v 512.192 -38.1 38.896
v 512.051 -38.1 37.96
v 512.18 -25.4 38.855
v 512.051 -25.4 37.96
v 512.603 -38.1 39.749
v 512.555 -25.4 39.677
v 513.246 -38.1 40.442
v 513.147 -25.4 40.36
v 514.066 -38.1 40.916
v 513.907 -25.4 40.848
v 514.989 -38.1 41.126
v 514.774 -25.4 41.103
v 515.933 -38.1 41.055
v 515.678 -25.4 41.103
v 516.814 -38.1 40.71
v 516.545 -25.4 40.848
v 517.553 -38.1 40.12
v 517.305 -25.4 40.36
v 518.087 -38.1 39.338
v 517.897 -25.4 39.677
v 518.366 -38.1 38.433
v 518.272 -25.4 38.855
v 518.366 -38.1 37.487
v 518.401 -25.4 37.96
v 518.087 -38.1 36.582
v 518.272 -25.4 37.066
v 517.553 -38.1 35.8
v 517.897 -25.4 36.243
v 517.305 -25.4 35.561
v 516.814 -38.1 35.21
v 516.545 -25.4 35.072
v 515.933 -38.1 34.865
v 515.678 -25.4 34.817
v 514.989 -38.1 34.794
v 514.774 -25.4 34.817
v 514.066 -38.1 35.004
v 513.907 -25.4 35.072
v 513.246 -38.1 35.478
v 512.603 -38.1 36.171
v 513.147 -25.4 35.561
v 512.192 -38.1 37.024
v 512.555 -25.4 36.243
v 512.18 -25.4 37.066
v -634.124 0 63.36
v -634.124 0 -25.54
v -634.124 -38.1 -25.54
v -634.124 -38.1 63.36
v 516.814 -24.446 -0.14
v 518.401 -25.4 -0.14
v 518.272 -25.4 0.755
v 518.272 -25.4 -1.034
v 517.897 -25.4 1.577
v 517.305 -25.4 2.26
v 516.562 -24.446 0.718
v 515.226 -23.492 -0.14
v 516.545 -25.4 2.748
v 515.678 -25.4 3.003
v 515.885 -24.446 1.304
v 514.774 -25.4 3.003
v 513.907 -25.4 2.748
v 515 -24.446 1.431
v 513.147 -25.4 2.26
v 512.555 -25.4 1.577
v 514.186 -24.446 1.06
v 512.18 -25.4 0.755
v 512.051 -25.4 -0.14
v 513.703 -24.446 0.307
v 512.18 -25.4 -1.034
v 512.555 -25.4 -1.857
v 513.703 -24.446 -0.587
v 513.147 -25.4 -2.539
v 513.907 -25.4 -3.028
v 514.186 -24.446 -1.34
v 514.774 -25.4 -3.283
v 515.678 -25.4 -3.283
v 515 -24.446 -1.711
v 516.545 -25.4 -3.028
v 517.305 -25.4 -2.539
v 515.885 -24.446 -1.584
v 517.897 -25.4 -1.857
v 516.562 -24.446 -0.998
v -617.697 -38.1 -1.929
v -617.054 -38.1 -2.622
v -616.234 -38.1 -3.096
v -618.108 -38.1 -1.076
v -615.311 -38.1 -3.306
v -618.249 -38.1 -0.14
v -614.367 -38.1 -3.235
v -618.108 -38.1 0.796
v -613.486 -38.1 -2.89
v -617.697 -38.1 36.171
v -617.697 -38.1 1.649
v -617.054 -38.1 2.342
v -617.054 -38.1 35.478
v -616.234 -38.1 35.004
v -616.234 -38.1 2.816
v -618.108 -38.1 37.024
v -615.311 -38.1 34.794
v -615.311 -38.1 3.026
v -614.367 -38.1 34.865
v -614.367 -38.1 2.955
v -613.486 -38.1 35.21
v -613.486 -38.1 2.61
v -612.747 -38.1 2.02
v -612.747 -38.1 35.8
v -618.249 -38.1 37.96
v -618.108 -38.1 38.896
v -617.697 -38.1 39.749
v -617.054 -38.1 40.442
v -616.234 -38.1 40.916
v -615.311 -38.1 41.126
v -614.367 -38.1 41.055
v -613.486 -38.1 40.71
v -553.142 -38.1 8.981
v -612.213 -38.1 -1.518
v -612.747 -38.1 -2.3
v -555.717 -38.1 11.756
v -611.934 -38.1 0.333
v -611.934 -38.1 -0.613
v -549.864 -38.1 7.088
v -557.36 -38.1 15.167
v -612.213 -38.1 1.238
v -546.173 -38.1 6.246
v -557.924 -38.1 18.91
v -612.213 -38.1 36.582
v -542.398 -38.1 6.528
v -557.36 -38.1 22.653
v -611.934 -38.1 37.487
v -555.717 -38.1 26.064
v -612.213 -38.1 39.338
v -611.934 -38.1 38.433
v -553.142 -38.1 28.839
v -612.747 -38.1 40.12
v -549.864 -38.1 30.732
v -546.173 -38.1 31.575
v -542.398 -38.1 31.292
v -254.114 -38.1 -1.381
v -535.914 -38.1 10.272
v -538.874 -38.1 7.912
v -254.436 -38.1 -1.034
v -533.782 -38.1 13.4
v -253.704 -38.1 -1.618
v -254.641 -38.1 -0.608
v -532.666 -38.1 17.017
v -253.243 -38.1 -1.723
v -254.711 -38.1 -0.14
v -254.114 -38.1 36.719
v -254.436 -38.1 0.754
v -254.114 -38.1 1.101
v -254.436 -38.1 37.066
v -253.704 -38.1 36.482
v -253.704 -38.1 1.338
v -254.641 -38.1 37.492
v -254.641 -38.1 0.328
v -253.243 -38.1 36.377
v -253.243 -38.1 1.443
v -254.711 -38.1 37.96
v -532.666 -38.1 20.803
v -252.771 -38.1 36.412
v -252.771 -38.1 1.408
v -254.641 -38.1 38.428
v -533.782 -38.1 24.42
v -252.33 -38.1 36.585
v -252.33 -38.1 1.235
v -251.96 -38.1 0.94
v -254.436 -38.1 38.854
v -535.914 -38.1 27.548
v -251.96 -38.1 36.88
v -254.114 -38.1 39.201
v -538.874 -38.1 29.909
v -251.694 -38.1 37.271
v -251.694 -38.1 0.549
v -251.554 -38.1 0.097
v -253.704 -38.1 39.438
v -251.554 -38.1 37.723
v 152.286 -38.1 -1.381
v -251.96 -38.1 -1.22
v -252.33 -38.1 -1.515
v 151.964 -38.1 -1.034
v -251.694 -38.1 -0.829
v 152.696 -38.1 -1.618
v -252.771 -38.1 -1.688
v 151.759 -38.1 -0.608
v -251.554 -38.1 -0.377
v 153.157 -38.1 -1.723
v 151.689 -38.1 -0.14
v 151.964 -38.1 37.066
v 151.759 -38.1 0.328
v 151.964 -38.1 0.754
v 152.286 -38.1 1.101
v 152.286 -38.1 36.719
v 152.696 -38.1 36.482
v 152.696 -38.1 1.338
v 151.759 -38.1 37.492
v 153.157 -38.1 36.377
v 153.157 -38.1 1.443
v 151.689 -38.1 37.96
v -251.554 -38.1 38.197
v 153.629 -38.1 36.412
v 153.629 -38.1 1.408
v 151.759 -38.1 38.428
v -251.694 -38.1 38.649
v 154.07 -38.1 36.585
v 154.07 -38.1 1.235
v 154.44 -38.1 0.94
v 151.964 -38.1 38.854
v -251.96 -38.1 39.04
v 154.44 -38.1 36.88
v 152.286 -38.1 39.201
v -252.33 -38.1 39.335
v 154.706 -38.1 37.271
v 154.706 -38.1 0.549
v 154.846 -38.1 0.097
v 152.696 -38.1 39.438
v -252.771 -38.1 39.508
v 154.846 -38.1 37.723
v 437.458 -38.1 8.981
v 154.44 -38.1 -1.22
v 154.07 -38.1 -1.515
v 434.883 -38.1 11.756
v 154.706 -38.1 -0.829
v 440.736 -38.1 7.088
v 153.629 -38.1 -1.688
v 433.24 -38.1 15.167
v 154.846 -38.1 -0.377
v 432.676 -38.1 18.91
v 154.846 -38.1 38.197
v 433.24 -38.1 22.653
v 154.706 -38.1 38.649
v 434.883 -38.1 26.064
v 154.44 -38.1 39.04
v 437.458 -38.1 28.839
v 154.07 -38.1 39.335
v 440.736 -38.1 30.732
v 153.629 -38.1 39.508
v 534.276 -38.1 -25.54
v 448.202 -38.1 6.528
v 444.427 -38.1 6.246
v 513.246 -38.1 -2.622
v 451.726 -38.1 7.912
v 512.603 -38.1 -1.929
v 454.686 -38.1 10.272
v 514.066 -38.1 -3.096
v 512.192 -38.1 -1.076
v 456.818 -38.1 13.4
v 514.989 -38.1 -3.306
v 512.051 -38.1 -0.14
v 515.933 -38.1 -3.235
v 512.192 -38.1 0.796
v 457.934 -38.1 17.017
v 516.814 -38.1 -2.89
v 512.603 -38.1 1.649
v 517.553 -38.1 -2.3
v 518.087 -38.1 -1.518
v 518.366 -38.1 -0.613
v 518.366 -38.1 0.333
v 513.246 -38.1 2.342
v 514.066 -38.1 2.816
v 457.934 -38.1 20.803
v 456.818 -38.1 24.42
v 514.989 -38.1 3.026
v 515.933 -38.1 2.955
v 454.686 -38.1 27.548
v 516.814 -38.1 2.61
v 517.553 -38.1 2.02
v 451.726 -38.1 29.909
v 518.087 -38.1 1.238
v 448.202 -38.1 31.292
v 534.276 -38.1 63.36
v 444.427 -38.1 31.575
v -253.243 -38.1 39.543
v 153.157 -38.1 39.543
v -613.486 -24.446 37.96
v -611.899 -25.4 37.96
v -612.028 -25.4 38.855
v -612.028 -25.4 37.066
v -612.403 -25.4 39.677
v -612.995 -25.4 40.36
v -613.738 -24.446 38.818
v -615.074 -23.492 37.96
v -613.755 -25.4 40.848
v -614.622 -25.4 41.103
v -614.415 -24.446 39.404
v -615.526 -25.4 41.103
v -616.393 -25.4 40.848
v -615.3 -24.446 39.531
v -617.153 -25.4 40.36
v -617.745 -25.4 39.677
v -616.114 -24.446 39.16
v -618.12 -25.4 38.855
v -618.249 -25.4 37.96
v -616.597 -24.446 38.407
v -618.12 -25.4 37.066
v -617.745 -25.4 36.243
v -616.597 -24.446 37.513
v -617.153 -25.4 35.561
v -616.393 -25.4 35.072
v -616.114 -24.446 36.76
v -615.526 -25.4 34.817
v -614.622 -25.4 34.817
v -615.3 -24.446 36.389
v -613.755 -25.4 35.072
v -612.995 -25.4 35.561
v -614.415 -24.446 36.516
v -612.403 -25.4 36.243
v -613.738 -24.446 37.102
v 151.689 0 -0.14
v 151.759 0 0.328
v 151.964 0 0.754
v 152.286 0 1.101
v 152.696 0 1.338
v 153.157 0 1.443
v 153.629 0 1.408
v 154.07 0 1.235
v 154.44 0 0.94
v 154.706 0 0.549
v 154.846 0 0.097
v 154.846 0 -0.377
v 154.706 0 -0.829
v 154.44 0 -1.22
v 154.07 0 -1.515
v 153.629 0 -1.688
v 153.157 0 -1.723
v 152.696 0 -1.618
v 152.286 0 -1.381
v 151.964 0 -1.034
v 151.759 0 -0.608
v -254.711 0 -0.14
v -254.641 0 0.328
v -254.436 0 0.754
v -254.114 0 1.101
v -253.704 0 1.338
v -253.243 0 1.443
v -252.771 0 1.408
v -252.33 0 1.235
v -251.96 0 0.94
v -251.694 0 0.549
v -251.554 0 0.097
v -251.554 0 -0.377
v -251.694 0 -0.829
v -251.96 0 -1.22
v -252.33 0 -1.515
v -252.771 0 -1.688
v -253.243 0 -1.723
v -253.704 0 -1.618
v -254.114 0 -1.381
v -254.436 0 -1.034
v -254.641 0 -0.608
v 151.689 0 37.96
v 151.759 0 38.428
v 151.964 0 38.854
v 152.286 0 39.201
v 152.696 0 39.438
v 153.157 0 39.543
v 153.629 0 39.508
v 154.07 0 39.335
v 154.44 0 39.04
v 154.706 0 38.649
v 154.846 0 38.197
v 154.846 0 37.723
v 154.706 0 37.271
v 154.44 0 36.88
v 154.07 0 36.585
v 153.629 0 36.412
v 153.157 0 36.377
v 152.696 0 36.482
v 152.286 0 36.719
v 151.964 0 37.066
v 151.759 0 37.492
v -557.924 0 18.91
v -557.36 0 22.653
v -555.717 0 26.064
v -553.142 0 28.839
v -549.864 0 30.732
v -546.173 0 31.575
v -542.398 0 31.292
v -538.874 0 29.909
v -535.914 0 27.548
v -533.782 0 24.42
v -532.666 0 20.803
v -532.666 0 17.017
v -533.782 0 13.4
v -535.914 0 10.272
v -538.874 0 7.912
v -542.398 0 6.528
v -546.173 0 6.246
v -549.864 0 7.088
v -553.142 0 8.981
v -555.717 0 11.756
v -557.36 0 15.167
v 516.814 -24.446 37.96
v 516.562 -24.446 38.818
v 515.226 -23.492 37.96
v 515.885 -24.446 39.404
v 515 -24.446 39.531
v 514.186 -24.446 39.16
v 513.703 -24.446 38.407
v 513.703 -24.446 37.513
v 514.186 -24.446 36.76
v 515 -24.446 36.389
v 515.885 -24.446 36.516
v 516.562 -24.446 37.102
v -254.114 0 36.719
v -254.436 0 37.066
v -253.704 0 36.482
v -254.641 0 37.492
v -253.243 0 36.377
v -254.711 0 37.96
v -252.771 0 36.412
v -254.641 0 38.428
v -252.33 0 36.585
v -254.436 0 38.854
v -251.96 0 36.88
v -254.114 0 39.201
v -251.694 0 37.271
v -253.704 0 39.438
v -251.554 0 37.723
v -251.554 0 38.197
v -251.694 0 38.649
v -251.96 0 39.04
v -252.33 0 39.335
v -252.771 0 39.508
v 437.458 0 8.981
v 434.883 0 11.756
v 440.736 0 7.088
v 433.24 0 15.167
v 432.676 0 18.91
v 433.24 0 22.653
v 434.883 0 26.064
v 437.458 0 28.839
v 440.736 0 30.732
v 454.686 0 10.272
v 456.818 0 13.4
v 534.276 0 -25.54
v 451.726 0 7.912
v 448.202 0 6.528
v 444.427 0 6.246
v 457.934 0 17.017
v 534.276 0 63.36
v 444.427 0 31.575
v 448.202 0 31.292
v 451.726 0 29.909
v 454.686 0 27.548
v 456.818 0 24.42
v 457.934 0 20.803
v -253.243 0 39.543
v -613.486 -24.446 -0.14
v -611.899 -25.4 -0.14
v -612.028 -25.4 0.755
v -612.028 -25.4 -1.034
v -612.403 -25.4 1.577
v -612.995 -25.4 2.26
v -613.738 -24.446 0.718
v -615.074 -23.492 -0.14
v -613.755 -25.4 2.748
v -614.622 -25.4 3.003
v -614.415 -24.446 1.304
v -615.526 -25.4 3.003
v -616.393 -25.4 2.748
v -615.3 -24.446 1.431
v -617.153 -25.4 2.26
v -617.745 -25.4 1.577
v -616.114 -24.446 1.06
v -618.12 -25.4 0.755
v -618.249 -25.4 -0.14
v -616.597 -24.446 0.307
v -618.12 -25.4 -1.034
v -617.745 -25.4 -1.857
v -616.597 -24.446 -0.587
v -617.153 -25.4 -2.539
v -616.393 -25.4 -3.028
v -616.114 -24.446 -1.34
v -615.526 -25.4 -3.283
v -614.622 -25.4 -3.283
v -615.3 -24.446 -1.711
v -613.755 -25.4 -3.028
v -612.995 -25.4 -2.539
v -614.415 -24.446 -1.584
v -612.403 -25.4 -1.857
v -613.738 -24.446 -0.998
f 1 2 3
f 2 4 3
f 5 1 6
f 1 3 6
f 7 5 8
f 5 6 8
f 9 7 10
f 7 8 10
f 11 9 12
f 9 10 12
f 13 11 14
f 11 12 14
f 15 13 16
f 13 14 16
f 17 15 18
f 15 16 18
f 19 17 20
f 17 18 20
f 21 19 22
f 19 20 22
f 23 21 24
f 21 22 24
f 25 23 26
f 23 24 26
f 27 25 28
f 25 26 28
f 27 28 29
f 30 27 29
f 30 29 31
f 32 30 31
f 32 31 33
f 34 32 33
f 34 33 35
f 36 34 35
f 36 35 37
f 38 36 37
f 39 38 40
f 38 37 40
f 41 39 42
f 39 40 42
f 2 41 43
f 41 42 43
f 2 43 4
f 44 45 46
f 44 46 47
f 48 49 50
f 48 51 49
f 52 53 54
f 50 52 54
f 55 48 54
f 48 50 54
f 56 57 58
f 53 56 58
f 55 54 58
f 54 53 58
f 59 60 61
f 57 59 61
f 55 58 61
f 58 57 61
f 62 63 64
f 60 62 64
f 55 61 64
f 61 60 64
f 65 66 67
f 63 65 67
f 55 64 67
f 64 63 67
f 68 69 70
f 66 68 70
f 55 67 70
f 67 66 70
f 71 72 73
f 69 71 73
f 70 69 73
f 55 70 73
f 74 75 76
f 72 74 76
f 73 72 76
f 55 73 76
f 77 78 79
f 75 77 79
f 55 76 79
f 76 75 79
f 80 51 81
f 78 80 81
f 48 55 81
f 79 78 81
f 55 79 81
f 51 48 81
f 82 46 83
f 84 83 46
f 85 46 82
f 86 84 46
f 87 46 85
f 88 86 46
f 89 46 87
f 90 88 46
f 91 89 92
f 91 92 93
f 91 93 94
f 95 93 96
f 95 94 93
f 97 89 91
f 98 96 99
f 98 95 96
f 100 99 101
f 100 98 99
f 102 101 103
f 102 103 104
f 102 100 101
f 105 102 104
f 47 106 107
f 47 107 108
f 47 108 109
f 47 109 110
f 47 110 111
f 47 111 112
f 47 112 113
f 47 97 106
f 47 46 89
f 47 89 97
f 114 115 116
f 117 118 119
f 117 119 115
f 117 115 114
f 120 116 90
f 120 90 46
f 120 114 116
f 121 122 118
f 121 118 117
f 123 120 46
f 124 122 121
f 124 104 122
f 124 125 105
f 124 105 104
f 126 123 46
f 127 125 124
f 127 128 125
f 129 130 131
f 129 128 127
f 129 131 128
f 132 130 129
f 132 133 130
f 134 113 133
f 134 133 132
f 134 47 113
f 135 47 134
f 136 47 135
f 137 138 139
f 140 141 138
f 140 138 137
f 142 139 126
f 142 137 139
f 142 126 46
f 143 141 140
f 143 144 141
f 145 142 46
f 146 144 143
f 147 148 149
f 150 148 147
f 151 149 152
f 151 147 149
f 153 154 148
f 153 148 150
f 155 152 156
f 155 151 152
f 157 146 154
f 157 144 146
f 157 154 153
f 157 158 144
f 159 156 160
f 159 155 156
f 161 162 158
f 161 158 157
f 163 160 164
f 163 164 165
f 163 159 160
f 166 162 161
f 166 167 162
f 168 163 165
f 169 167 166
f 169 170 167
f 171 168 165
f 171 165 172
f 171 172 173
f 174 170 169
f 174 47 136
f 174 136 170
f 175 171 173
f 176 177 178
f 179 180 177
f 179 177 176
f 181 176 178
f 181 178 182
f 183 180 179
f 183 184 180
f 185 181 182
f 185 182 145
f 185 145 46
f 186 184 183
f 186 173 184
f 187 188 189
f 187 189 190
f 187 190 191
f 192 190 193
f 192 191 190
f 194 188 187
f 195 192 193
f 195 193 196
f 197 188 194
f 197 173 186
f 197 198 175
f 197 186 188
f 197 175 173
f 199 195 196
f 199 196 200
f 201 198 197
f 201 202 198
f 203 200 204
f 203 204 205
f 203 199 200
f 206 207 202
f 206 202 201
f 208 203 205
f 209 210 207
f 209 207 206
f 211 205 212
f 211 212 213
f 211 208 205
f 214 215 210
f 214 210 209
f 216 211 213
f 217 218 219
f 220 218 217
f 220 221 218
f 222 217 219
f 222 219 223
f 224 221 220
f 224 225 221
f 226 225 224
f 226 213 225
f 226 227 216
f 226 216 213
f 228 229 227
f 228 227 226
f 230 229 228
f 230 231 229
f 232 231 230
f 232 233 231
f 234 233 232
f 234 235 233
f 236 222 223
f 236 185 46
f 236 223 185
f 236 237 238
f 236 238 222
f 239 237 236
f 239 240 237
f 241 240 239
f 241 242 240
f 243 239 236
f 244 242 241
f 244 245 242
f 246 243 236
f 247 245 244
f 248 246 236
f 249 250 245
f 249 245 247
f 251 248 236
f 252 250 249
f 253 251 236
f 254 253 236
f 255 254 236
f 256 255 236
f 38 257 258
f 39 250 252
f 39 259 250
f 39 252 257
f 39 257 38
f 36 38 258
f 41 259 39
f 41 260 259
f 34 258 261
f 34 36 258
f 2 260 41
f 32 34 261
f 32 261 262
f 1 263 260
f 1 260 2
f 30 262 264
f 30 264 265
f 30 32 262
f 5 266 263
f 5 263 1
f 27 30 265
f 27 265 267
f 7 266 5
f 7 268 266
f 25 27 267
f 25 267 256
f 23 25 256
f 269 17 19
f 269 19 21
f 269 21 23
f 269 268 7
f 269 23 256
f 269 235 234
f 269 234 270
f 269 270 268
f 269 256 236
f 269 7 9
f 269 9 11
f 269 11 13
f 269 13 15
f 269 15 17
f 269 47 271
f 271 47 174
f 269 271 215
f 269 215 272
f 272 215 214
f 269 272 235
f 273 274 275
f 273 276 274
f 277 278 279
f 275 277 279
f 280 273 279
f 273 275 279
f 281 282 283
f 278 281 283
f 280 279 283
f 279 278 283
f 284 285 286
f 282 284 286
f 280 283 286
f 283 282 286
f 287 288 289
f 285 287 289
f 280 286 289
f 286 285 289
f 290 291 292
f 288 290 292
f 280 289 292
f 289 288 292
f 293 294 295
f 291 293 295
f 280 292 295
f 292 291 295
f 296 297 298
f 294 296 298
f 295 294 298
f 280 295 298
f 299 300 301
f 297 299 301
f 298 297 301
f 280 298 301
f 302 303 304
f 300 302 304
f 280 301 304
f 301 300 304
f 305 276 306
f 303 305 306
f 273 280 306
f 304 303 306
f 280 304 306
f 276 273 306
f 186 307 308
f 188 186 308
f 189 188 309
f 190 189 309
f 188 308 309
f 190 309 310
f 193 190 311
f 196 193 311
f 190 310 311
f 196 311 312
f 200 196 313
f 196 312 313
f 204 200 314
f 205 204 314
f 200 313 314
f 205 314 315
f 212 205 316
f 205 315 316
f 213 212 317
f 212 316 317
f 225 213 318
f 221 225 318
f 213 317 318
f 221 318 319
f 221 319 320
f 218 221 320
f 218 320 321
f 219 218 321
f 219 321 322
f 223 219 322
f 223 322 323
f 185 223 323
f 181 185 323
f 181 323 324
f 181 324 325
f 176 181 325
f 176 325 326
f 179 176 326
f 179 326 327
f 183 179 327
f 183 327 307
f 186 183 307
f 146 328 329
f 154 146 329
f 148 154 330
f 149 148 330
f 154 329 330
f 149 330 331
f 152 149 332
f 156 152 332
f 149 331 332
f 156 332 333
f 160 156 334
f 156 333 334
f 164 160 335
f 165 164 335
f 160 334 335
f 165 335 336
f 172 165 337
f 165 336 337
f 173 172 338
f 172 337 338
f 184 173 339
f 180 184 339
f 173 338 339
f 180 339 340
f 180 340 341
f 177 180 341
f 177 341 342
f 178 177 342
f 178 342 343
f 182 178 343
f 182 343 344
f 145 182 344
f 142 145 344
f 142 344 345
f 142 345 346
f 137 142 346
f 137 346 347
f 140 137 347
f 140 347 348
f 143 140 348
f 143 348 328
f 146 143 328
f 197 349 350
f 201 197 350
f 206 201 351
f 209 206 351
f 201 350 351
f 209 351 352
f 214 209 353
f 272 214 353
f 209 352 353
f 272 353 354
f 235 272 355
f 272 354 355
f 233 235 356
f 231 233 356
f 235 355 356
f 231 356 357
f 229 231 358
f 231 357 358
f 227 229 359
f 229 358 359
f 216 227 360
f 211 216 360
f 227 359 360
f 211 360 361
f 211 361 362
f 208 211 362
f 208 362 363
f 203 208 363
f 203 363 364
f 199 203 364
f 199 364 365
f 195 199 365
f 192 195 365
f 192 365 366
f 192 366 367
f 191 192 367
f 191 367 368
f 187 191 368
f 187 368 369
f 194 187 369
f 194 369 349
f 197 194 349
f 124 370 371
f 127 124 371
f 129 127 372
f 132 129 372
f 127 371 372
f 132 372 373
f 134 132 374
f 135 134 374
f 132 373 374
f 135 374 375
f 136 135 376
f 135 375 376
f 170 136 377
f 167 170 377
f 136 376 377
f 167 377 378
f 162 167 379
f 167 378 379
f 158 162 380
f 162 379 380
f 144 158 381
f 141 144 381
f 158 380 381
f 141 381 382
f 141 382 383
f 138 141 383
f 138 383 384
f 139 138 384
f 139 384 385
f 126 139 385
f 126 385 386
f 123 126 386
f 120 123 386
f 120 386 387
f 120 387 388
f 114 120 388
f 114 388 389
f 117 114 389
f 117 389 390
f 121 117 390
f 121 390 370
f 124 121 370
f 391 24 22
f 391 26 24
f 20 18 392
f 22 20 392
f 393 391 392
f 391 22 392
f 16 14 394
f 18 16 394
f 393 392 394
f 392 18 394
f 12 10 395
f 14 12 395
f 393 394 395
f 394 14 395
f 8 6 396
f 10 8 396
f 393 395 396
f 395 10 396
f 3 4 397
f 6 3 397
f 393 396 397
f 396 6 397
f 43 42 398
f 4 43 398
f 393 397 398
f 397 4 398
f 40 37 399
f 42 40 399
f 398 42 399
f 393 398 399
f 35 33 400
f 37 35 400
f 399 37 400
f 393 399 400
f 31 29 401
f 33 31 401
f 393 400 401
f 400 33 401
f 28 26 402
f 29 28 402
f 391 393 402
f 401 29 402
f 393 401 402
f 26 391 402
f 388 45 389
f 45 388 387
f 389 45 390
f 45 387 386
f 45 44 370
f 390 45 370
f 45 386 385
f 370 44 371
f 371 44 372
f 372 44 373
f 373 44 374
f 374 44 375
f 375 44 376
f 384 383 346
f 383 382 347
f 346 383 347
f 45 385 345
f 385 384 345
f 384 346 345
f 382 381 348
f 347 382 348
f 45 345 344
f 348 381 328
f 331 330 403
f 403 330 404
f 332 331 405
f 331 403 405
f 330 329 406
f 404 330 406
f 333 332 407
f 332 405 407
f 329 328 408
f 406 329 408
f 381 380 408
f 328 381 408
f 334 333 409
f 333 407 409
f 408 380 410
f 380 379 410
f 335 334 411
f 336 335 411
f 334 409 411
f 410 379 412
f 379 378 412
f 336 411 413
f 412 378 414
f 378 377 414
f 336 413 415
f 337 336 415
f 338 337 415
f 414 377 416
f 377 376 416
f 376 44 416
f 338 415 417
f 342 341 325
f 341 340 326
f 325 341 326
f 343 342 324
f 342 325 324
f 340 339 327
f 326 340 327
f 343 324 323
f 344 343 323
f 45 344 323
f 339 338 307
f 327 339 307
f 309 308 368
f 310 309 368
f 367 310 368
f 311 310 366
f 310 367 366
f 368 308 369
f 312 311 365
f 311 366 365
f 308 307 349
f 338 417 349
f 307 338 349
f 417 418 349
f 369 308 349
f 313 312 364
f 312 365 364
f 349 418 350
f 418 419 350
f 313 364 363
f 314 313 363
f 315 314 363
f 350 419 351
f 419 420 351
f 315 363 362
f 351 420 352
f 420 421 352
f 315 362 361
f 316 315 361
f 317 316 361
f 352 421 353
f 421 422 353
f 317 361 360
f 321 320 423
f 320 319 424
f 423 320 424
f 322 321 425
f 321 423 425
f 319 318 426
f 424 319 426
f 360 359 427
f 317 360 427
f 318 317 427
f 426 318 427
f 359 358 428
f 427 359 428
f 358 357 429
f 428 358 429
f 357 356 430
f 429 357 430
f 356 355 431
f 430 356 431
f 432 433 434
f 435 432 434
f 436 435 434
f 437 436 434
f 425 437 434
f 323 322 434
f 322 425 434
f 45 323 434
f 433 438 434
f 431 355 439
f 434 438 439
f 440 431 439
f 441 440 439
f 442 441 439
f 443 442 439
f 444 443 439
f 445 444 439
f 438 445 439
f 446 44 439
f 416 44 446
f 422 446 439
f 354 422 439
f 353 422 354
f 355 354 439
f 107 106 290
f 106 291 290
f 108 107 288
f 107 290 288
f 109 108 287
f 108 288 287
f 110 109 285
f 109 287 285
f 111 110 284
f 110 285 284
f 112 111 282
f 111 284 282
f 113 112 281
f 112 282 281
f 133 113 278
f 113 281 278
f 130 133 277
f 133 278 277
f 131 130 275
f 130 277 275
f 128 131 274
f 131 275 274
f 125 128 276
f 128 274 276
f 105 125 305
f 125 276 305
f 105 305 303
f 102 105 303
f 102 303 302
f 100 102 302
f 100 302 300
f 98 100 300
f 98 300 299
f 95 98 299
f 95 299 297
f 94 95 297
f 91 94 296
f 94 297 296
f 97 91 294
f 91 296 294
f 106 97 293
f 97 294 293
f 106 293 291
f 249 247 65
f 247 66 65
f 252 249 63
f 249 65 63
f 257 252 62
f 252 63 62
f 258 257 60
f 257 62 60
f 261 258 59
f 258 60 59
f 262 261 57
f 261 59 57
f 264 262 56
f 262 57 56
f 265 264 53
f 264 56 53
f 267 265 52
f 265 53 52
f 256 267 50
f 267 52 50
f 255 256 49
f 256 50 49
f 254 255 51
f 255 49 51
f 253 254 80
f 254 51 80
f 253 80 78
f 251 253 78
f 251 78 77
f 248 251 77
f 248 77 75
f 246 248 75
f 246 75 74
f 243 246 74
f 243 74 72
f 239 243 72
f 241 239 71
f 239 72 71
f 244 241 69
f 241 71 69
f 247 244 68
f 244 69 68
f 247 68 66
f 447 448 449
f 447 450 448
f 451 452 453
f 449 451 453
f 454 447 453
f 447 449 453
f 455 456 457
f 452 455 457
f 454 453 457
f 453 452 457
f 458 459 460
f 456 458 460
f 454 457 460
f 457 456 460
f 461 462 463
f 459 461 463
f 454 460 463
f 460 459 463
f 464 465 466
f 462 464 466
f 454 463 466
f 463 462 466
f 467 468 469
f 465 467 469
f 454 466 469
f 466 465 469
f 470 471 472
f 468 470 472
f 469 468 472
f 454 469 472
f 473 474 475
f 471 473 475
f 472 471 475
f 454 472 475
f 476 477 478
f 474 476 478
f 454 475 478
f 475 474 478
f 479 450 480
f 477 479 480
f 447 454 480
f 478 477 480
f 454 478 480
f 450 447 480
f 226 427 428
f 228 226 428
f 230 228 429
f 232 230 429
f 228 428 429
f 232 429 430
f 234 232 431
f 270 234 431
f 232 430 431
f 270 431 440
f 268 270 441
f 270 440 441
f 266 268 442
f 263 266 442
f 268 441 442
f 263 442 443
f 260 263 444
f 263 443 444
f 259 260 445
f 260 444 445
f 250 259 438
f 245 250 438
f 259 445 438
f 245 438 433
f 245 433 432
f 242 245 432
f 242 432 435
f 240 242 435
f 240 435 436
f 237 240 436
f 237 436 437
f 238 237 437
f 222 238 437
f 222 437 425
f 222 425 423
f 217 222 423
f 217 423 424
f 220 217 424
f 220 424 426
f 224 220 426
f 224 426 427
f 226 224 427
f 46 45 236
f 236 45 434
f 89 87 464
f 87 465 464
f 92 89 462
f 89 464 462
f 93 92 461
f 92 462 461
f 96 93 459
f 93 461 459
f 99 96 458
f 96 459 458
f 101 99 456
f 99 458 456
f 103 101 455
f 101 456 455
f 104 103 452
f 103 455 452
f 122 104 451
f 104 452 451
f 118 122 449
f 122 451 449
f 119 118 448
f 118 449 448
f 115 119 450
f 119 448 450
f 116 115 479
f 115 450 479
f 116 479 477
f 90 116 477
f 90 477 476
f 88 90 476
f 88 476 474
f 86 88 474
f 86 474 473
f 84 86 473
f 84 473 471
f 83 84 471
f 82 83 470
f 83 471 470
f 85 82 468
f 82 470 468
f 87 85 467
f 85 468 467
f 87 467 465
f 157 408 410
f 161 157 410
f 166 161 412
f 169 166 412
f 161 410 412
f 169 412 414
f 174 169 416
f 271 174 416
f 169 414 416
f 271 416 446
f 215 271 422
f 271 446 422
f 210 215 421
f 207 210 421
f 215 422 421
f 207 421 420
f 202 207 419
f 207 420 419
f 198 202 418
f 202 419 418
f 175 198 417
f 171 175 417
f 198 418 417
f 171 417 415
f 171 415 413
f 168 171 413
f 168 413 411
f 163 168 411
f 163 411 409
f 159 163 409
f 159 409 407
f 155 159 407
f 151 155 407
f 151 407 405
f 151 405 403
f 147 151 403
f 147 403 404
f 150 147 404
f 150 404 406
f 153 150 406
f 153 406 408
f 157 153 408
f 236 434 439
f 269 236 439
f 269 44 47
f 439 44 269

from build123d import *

# Parameters (mm, degrees)
F0_W     = 1168.4
F0_H     = 88.9
F1_DEPTH = 38.1
F3_D     = 6.35
F3_DEPTH = 12.7
F3_TIP   = 1.9077324654
F5_D     = 25.4
F7_D     = 3.175


with BuildPart() as f1:
    # F0 (on Front) → F1 (new body)
    with BuildSketch(Plane.XZ):
        with Locations((-49.923974567, 18.9100238495)):
            Rectangle(F0_W, F0_H)
    extrude(amount=F1_DEPTH)

    # F3
    with Locations(Plane.XZ.offset(38.1)):
        with Locations((515.226025433, 37.9600238495), (515.226025433, -0.1399761505), (-615.073974567, 37.9600238495), (-615.073974567, -0.1399761505)):
            Hole(F3_D / 2, depth=F3_DEPTH)
            with Locations((0, 0, -(F3_DEPTH + F3_TIP / 2))):  # 118° drill point
                Cone(0, F3_D / 2, F3_TIP, mode=Mode.SUBTRACT)

    # F5 (through all)
    with Locations(Plane.XZ.offset(38.1)):
        with Locations((-545.223974567, 18.9100238495), (445.376025433, 18.9100238495)):
            Hole(F5_D / 2)

    # F7 (through all)
    with Locations(Plane.XZ.offset(38.1)):
        with Locations((-253.123974567, 37.9600238495), (-253.123974567, -0.1399761505), (153.276025433, 37.9600238495), (153.276025433, -0.1399761505)):
            Hole(F7_D / 2)


solid = f1.part
